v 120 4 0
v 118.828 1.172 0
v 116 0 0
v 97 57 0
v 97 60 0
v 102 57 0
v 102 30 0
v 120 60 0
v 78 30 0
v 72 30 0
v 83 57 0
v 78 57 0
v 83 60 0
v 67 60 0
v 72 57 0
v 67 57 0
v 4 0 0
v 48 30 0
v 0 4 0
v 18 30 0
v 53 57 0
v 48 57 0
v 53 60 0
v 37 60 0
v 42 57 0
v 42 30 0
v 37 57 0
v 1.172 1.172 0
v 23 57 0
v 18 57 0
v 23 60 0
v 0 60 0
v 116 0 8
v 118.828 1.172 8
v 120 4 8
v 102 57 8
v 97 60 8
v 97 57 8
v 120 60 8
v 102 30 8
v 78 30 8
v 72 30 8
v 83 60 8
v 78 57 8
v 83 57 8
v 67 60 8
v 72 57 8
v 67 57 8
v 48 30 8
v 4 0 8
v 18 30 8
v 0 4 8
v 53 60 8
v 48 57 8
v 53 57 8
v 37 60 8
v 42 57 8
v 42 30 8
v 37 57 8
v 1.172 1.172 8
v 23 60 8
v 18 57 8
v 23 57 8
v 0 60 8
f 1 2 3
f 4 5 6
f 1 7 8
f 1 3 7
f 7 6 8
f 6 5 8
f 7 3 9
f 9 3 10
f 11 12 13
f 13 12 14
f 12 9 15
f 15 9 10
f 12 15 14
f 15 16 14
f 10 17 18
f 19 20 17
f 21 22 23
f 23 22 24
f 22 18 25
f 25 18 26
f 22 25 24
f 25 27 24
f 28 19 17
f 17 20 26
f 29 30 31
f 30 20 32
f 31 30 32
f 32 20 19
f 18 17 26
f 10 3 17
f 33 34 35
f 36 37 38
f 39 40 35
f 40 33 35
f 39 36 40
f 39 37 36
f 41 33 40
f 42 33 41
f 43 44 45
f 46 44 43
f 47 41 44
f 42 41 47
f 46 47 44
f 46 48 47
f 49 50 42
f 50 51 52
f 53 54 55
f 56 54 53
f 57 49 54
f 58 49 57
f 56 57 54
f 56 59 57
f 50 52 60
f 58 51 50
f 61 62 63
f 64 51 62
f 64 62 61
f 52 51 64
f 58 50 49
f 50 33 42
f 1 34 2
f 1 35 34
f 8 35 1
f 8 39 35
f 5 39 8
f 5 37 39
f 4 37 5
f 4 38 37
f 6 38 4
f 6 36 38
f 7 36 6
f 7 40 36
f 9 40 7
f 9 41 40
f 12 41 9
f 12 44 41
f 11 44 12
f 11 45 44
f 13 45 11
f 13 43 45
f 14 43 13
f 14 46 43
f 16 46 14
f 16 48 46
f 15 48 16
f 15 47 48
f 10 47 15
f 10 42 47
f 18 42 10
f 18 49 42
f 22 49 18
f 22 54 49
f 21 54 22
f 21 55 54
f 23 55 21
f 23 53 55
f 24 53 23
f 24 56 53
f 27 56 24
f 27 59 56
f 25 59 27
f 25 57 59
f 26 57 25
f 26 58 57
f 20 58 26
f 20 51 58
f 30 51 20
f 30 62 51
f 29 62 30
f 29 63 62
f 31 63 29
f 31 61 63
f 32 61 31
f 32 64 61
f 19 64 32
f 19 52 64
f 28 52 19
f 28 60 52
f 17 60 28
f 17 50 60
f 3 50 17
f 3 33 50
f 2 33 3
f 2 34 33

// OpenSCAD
$fn = 32;

// ----------------------------------------------------------------------
// Oversize slot bar: 120 mm bar with 3 oversize windows
// ----------------------------------------------------------------------

// --- parameters (mm) ---
profile_height = 8;       // extrusion height
profile_points = 32;      // points of the closed outline

profile = [[0, 4], [1.172, 1.172], [4, 0], [116, 0], [118.828, 1.172], [120, 4], [120, 60], [97, 60], [97, 57], [102, 57], [102, 30], [78, 30], [78, 57], [83, 57], [83, 60], [67, 60], [67, 57], [72, 57], [72, 30], [48, 30], [48, 57], [53, 57], [53, 60], [37, 60], [37, 57], [42, 57], [42, 30], [18, 30], [18, 57], [23, 57], [23, 60], [0, 60]];  // single closed polygon, 32 points, counter clockwise

// --- the one profile operation ---
linear_extrude(height = profile_height) polygon(points = profile);
